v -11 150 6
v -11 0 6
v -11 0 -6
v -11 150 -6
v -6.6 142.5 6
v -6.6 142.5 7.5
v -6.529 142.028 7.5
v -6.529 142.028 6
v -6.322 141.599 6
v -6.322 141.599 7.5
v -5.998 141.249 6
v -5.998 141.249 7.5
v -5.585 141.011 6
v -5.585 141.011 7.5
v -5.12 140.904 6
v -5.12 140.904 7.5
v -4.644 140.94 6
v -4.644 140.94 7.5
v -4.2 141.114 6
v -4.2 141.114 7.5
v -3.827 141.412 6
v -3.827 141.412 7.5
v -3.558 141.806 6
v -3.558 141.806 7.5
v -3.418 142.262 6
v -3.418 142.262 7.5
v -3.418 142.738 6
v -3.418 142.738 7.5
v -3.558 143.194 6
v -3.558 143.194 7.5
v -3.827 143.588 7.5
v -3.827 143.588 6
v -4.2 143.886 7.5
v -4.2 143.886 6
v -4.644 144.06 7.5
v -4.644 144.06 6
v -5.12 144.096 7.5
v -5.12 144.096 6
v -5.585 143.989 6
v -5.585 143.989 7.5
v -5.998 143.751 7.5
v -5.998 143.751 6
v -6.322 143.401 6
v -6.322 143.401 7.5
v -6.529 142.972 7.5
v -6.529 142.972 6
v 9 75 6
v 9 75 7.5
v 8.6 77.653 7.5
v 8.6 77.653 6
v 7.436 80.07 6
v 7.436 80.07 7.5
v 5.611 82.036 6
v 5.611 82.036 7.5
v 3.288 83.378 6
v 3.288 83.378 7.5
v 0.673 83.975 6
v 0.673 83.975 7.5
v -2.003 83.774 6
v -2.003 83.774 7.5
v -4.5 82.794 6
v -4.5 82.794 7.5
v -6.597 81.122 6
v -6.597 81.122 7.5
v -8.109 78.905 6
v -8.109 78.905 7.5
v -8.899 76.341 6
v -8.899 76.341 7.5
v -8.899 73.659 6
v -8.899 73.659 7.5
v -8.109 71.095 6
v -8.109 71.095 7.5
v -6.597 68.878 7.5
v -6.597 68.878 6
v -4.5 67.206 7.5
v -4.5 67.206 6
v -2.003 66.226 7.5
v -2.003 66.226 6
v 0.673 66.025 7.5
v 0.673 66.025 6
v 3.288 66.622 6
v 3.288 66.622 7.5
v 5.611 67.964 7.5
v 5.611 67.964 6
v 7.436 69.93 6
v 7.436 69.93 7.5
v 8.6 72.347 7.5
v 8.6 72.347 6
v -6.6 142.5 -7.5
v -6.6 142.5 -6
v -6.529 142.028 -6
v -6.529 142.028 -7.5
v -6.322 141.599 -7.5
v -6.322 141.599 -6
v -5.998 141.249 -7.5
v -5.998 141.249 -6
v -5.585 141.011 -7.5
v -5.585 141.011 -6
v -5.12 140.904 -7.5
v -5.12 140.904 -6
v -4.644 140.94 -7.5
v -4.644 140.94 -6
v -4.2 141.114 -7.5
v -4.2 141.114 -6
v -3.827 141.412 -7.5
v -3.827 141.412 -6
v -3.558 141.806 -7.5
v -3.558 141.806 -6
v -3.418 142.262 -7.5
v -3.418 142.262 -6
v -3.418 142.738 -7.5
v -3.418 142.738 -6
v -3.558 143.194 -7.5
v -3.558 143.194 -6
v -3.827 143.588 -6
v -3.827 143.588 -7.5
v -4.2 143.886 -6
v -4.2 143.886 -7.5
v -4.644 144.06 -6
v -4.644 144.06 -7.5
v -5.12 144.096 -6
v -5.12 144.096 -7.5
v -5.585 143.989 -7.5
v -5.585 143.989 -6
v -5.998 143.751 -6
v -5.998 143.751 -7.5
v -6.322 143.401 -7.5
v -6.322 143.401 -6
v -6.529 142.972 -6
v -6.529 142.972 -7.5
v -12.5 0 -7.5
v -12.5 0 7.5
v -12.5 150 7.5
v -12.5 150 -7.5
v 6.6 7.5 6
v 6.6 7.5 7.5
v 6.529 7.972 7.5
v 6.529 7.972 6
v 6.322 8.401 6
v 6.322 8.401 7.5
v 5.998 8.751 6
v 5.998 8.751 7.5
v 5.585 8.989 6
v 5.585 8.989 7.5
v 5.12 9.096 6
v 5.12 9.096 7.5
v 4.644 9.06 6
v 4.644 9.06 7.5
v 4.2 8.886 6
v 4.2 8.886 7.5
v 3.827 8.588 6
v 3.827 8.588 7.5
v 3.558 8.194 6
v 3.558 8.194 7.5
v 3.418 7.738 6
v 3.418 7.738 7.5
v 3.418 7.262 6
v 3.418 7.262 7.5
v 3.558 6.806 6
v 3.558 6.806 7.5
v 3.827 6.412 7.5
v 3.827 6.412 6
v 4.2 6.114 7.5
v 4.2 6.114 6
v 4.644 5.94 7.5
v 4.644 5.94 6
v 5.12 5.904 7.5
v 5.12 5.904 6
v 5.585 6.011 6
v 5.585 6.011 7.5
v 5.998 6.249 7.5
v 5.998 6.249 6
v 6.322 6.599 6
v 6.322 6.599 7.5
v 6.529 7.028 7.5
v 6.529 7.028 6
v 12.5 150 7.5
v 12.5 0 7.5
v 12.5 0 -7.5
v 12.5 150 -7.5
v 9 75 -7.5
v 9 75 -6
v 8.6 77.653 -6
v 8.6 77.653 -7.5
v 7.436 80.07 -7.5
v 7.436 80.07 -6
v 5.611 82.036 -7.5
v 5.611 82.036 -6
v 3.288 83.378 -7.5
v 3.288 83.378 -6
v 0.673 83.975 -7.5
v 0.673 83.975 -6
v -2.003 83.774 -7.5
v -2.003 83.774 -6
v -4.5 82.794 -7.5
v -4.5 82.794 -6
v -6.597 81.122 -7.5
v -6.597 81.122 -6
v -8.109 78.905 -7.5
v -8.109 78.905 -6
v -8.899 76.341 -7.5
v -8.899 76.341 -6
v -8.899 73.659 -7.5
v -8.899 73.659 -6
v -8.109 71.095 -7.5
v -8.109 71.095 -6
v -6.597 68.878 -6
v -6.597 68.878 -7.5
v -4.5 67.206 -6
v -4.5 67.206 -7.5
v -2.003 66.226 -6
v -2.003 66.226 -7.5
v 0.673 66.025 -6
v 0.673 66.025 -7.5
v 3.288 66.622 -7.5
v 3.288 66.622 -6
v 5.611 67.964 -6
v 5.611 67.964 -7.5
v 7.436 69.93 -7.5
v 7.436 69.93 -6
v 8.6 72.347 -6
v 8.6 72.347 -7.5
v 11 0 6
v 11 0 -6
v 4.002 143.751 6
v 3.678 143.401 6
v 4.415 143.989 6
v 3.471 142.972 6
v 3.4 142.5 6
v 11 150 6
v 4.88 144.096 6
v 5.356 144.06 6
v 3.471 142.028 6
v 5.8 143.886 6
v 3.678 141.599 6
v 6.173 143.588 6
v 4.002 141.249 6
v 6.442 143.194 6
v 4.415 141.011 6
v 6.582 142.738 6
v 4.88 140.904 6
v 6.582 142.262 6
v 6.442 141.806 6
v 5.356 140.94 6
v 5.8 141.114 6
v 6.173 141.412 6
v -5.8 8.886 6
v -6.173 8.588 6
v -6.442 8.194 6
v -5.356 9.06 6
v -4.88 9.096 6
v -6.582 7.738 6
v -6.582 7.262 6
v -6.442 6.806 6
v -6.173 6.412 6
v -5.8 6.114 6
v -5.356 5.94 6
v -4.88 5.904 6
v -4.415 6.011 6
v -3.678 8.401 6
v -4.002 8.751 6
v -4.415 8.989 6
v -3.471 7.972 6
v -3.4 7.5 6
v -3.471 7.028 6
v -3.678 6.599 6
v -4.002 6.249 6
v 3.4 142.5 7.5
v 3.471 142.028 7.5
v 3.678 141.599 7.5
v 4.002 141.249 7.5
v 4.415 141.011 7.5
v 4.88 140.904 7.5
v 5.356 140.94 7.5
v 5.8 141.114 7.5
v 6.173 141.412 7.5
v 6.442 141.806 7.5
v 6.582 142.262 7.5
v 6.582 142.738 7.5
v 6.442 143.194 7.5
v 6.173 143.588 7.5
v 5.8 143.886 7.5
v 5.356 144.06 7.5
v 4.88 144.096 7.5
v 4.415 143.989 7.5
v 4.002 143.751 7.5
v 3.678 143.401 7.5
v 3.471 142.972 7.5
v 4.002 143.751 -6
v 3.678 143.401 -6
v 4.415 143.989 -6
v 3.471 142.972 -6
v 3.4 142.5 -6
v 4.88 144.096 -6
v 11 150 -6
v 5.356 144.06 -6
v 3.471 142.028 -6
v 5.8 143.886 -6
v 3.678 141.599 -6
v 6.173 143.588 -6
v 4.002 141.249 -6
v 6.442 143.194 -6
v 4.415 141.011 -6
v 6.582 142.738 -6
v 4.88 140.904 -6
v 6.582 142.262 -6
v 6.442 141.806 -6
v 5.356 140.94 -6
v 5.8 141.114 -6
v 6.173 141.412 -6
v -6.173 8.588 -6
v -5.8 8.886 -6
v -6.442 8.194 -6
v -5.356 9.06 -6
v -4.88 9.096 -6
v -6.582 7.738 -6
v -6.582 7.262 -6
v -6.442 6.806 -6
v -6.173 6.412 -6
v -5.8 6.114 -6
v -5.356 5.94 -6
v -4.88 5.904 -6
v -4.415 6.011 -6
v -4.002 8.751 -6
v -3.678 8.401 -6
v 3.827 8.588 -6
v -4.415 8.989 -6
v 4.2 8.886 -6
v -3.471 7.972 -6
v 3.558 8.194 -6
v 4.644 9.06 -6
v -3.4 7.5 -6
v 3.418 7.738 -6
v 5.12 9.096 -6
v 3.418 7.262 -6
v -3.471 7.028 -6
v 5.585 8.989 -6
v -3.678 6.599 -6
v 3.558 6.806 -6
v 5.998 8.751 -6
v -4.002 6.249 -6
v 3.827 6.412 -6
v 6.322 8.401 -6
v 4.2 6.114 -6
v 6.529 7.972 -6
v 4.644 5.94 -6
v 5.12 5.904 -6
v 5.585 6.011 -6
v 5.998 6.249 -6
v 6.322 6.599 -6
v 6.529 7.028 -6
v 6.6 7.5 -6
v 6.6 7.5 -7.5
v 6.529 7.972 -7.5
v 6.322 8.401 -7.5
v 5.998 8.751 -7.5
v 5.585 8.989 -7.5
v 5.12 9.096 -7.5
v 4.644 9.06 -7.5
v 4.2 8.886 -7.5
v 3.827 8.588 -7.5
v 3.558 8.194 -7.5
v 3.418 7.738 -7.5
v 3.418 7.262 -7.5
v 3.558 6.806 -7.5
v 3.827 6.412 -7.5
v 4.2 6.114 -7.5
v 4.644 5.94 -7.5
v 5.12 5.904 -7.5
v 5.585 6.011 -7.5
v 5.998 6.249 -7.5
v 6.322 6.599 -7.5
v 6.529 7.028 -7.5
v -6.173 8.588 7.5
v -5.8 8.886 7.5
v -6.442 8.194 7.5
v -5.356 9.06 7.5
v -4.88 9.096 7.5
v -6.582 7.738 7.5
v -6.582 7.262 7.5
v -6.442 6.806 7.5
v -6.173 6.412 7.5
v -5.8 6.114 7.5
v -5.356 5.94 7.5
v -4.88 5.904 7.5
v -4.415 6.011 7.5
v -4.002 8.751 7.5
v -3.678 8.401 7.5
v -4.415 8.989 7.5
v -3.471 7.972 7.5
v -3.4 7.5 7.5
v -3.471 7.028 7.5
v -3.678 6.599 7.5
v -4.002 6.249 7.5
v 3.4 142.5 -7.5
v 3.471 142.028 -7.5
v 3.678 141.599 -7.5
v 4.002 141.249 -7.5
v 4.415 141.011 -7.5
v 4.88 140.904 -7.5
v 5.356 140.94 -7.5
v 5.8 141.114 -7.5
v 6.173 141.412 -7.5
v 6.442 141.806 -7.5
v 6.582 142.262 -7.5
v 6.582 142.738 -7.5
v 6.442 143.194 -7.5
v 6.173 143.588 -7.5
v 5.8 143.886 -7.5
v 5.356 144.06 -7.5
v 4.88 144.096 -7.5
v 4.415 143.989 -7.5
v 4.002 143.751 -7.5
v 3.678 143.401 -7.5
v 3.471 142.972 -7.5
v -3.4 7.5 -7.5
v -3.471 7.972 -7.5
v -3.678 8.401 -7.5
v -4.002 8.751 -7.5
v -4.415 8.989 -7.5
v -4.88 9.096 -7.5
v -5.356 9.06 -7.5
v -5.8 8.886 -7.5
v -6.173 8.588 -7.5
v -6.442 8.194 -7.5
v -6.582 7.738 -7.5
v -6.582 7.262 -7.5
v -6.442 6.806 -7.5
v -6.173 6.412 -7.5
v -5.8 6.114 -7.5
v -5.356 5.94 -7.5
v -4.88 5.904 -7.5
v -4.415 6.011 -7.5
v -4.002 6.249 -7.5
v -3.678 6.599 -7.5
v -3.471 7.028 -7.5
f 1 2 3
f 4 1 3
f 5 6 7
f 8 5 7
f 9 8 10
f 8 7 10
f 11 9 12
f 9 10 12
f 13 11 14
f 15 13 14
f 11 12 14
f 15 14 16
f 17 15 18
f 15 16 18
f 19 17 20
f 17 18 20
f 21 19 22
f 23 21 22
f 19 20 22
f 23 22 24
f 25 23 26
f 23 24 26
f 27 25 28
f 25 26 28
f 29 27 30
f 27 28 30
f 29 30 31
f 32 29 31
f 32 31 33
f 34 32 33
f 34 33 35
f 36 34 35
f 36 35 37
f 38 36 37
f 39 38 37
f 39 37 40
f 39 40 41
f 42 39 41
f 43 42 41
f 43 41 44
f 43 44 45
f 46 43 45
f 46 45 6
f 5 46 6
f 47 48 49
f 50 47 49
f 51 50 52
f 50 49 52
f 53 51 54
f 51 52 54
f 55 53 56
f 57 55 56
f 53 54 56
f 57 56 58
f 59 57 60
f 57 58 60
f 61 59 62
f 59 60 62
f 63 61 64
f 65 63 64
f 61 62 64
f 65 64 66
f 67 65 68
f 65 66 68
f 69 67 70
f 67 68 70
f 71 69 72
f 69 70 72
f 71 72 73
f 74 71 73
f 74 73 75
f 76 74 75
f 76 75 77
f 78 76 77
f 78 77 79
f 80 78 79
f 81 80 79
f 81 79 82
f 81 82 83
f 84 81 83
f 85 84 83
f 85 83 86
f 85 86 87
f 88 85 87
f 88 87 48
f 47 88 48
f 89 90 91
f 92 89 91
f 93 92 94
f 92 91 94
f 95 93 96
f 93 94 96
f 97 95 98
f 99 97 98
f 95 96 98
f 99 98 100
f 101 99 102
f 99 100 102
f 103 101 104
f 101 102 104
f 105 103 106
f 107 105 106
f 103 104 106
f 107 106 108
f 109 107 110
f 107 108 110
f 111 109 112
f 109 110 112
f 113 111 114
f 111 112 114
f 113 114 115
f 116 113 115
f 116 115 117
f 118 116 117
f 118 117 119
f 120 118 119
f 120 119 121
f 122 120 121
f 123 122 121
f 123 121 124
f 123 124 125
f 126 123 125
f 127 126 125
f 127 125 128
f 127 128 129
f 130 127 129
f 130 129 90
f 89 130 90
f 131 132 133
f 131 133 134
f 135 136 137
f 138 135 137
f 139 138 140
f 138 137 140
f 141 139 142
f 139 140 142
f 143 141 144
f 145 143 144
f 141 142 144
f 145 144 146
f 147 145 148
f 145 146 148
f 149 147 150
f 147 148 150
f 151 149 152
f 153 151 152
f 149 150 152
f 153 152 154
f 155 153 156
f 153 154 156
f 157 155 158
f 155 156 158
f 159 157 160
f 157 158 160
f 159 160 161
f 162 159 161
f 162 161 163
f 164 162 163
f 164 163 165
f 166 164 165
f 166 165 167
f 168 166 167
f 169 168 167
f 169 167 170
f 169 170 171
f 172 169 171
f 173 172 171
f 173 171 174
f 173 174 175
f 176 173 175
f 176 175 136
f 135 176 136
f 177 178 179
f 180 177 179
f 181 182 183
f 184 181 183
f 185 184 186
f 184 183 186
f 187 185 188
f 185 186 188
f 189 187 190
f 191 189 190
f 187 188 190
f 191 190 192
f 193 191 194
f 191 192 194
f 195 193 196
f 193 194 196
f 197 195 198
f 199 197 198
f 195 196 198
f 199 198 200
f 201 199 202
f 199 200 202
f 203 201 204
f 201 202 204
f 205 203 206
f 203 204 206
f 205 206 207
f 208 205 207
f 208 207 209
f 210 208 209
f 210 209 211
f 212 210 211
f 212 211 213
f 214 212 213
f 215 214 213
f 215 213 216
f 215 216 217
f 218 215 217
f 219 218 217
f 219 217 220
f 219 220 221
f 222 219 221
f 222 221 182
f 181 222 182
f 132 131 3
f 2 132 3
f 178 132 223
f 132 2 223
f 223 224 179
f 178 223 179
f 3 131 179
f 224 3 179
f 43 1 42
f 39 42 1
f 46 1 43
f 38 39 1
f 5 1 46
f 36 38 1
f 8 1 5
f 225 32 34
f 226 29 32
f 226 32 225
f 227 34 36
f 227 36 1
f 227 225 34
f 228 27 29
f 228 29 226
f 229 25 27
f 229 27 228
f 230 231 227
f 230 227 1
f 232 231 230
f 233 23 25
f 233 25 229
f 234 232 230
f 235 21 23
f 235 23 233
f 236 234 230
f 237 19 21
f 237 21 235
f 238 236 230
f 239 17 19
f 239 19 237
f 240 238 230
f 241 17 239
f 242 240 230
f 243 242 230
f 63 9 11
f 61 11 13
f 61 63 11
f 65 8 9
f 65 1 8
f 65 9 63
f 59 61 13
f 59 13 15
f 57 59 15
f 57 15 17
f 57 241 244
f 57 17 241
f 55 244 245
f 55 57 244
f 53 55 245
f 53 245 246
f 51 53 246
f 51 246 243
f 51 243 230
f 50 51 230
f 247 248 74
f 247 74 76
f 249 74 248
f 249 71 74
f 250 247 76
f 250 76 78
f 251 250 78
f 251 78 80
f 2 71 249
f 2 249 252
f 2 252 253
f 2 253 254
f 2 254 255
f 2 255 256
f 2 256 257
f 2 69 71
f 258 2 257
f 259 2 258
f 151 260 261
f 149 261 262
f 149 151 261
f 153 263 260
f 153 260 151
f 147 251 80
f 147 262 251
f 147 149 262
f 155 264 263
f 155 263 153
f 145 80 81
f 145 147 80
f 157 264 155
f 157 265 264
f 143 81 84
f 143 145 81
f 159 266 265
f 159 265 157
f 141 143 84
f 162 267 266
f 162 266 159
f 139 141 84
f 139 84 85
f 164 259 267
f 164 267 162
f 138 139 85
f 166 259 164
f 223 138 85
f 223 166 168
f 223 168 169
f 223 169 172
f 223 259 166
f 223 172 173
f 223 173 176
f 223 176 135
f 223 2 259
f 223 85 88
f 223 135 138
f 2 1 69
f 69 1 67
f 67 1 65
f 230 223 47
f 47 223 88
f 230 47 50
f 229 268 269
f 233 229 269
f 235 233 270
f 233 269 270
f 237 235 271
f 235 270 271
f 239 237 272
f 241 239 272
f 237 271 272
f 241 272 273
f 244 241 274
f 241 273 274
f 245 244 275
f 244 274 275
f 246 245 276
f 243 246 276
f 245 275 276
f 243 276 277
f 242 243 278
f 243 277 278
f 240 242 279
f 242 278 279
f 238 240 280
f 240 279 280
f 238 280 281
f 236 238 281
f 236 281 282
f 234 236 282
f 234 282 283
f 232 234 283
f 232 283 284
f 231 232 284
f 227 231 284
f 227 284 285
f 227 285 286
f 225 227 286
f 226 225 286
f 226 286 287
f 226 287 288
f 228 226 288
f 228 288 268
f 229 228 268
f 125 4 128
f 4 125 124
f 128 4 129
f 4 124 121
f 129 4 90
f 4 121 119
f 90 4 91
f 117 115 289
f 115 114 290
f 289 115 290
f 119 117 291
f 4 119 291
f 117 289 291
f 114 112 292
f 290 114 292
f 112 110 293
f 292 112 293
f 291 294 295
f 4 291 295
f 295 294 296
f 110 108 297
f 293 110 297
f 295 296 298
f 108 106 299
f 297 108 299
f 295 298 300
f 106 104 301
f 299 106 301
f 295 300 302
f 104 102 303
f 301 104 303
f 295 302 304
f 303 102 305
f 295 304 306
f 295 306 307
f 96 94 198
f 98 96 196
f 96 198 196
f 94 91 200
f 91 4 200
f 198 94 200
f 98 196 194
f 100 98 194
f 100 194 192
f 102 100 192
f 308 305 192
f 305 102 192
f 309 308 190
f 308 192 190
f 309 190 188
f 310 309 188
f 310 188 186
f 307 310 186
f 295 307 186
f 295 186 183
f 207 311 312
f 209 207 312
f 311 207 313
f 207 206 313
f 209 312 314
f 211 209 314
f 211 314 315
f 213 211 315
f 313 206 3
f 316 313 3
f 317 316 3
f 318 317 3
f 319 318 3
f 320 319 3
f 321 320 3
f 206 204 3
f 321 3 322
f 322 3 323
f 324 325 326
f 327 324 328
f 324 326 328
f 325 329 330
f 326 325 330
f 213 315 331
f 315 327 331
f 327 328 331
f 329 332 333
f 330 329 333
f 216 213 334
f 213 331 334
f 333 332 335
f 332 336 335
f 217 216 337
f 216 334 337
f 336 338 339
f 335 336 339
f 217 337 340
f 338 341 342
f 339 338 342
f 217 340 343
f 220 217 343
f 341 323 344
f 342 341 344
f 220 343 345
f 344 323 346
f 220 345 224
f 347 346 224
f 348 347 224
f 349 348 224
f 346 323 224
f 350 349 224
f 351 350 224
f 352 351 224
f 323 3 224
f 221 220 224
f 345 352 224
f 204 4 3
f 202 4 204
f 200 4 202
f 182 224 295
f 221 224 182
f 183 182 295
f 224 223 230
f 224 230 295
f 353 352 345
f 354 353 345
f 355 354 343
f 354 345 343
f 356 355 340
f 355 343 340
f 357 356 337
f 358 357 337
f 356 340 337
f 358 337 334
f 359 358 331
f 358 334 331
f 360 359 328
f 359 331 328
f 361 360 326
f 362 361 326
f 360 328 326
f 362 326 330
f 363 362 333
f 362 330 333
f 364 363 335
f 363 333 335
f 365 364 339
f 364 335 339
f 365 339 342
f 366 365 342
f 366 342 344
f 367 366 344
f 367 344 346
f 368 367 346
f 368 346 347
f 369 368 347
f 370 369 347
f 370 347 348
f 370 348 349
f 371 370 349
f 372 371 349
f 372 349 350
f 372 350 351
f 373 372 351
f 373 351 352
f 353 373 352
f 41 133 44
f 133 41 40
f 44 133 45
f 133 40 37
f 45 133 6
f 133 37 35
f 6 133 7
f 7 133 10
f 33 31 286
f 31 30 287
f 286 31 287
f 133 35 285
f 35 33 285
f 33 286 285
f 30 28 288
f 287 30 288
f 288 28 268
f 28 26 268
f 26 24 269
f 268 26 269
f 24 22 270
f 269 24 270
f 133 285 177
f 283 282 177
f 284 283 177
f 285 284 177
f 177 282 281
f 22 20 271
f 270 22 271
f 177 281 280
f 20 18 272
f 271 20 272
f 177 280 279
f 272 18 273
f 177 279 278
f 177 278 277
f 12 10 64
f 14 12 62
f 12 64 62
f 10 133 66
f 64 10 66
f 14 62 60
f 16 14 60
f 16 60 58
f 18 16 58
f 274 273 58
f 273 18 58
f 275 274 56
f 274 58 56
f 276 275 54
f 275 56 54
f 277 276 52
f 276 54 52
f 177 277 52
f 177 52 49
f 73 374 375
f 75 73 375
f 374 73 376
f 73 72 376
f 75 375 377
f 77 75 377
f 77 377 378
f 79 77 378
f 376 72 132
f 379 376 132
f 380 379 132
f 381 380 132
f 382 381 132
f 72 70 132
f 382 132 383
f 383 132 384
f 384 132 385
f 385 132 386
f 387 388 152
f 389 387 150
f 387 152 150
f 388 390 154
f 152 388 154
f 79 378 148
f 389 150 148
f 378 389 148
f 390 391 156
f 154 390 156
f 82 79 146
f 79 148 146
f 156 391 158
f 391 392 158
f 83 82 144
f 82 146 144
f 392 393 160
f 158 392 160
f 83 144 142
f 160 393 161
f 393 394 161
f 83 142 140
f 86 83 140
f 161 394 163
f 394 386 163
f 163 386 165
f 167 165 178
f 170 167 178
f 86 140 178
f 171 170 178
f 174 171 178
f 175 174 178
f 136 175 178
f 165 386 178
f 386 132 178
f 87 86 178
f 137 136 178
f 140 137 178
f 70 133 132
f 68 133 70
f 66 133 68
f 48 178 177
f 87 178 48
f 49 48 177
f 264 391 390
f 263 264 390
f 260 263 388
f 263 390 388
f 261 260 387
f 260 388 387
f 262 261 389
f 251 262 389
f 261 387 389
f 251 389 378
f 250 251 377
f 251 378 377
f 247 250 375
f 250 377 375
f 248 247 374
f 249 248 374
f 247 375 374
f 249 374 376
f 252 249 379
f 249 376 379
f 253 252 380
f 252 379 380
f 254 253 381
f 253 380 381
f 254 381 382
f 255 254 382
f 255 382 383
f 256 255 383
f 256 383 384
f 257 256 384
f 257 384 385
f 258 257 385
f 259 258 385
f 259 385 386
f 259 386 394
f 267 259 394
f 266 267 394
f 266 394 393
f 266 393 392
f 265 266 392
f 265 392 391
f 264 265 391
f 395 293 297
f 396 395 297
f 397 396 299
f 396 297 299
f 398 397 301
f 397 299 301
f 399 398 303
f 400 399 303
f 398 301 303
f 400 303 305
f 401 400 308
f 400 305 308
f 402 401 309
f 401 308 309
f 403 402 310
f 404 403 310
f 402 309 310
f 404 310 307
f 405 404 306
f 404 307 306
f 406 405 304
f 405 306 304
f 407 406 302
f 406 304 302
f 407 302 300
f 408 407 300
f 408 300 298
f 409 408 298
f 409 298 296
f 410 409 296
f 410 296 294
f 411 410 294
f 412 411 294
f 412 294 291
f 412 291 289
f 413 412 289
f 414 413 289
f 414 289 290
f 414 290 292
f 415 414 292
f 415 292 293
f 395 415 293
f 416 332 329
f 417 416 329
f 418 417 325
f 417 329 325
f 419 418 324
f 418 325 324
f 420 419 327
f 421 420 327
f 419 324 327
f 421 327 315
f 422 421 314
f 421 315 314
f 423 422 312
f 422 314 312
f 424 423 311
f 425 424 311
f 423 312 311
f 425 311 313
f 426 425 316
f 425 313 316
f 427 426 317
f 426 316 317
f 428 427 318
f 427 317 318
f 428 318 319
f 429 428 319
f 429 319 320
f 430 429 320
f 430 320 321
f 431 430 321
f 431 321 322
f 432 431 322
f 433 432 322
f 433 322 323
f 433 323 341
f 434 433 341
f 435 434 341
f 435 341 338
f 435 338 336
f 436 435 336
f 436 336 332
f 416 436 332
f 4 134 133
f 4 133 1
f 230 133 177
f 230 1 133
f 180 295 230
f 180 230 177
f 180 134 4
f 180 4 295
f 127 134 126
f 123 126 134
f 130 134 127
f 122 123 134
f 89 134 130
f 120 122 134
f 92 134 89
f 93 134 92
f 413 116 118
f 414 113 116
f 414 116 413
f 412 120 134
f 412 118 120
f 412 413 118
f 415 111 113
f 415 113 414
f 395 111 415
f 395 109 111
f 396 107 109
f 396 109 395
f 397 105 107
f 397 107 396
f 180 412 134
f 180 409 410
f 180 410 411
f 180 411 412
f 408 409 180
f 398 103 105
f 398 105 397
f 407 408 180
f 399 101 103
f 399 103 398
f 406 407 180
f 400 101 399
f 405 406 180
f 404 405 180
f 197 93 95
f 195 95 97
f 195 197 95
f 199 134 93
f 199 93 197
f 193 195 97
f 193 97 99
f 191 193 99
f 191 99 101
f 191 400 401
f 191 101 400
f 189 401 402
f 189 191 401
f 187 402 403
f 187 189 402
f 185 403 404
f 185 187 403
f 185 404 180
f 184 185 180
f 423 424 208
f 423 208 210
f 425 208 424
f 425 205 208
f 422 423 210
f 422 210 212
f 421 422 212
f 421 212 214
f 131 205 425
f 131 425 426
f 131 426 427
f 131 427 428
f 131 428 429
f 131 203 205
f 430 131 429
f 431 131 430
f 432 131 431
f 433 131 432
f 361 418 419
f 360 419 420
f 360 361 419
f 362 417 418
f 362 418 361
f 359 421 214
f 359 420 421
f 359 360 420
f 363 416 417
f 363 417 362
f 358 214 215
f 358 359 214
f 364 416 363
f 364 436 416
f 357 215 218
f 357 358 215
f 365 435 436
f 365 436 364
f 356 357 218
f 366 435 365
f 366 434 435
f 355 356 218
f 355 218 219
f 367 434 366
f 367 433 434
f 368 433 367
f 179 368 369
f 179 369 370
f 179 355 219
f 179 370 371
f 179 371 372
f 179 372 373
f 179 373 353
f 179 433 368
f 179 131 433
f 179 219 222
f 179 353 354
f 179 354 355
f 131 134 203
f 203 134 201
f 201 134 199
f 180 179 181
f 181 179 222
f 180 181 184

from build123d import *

# Parameters (mm, degrees)
SKETCH_1_W          = 25
SKETCH_1_H          = 15
SKETCH_1_W_2        = 22
SKETCH_1_H_2        = 12
EXTRUDE_1_DEPTH     = 150
SKETCH_2_R          = 1.6
SKETCH_2_R_2        = 9
CUT_EXTRUDE_1_DEPTH = 152.265495074


with BuildPart() as part:
    # ｽｹｯﾁ1 → ﾎﾞｽ - 押し出し1 (new body)
    with BuildSketch(Plane(origin=(0, 0, 0), x_dir=(1, 0, 0), z_dir=(0, 1, 0))):
        Rectangle(SKETCH_1_W, SKETCH_1_H)
        Rectangle(SKETCH_1_W_2, SKETCH_1_H_2, mode=Mode.SUBTRACT)
    extrude(amount=EXTRUDE_1_DEPTH)

    # ｽｹｯﾁ2 → ｶｯﾄ - 押し出し1 (cut, through all)
    with BuildSketch(Plane.XY.offset(7.5)):
        with Locations((5, 7.5)):
            Circle(SKETCH_2_R)
        with Locations((-5, 7.5)):
            Circle(SKETCH_2_R)
        with Locations(Location((5, 142.5, 0), (0, 0, 180))):
            Circle(SKETCH_2_R)
        with Locations(Location((-5, 142.5, 0), (0, 0, 180))):
            Circle(SKETCH_2_R)
        with Locations((0, 75)):
            Circle(SKETCH_2_R_2)
    extrude(amount=-CUT_EXTRUDE_1_DEPTH, mode=Mode.SUBTRACT)


solid = part.part
